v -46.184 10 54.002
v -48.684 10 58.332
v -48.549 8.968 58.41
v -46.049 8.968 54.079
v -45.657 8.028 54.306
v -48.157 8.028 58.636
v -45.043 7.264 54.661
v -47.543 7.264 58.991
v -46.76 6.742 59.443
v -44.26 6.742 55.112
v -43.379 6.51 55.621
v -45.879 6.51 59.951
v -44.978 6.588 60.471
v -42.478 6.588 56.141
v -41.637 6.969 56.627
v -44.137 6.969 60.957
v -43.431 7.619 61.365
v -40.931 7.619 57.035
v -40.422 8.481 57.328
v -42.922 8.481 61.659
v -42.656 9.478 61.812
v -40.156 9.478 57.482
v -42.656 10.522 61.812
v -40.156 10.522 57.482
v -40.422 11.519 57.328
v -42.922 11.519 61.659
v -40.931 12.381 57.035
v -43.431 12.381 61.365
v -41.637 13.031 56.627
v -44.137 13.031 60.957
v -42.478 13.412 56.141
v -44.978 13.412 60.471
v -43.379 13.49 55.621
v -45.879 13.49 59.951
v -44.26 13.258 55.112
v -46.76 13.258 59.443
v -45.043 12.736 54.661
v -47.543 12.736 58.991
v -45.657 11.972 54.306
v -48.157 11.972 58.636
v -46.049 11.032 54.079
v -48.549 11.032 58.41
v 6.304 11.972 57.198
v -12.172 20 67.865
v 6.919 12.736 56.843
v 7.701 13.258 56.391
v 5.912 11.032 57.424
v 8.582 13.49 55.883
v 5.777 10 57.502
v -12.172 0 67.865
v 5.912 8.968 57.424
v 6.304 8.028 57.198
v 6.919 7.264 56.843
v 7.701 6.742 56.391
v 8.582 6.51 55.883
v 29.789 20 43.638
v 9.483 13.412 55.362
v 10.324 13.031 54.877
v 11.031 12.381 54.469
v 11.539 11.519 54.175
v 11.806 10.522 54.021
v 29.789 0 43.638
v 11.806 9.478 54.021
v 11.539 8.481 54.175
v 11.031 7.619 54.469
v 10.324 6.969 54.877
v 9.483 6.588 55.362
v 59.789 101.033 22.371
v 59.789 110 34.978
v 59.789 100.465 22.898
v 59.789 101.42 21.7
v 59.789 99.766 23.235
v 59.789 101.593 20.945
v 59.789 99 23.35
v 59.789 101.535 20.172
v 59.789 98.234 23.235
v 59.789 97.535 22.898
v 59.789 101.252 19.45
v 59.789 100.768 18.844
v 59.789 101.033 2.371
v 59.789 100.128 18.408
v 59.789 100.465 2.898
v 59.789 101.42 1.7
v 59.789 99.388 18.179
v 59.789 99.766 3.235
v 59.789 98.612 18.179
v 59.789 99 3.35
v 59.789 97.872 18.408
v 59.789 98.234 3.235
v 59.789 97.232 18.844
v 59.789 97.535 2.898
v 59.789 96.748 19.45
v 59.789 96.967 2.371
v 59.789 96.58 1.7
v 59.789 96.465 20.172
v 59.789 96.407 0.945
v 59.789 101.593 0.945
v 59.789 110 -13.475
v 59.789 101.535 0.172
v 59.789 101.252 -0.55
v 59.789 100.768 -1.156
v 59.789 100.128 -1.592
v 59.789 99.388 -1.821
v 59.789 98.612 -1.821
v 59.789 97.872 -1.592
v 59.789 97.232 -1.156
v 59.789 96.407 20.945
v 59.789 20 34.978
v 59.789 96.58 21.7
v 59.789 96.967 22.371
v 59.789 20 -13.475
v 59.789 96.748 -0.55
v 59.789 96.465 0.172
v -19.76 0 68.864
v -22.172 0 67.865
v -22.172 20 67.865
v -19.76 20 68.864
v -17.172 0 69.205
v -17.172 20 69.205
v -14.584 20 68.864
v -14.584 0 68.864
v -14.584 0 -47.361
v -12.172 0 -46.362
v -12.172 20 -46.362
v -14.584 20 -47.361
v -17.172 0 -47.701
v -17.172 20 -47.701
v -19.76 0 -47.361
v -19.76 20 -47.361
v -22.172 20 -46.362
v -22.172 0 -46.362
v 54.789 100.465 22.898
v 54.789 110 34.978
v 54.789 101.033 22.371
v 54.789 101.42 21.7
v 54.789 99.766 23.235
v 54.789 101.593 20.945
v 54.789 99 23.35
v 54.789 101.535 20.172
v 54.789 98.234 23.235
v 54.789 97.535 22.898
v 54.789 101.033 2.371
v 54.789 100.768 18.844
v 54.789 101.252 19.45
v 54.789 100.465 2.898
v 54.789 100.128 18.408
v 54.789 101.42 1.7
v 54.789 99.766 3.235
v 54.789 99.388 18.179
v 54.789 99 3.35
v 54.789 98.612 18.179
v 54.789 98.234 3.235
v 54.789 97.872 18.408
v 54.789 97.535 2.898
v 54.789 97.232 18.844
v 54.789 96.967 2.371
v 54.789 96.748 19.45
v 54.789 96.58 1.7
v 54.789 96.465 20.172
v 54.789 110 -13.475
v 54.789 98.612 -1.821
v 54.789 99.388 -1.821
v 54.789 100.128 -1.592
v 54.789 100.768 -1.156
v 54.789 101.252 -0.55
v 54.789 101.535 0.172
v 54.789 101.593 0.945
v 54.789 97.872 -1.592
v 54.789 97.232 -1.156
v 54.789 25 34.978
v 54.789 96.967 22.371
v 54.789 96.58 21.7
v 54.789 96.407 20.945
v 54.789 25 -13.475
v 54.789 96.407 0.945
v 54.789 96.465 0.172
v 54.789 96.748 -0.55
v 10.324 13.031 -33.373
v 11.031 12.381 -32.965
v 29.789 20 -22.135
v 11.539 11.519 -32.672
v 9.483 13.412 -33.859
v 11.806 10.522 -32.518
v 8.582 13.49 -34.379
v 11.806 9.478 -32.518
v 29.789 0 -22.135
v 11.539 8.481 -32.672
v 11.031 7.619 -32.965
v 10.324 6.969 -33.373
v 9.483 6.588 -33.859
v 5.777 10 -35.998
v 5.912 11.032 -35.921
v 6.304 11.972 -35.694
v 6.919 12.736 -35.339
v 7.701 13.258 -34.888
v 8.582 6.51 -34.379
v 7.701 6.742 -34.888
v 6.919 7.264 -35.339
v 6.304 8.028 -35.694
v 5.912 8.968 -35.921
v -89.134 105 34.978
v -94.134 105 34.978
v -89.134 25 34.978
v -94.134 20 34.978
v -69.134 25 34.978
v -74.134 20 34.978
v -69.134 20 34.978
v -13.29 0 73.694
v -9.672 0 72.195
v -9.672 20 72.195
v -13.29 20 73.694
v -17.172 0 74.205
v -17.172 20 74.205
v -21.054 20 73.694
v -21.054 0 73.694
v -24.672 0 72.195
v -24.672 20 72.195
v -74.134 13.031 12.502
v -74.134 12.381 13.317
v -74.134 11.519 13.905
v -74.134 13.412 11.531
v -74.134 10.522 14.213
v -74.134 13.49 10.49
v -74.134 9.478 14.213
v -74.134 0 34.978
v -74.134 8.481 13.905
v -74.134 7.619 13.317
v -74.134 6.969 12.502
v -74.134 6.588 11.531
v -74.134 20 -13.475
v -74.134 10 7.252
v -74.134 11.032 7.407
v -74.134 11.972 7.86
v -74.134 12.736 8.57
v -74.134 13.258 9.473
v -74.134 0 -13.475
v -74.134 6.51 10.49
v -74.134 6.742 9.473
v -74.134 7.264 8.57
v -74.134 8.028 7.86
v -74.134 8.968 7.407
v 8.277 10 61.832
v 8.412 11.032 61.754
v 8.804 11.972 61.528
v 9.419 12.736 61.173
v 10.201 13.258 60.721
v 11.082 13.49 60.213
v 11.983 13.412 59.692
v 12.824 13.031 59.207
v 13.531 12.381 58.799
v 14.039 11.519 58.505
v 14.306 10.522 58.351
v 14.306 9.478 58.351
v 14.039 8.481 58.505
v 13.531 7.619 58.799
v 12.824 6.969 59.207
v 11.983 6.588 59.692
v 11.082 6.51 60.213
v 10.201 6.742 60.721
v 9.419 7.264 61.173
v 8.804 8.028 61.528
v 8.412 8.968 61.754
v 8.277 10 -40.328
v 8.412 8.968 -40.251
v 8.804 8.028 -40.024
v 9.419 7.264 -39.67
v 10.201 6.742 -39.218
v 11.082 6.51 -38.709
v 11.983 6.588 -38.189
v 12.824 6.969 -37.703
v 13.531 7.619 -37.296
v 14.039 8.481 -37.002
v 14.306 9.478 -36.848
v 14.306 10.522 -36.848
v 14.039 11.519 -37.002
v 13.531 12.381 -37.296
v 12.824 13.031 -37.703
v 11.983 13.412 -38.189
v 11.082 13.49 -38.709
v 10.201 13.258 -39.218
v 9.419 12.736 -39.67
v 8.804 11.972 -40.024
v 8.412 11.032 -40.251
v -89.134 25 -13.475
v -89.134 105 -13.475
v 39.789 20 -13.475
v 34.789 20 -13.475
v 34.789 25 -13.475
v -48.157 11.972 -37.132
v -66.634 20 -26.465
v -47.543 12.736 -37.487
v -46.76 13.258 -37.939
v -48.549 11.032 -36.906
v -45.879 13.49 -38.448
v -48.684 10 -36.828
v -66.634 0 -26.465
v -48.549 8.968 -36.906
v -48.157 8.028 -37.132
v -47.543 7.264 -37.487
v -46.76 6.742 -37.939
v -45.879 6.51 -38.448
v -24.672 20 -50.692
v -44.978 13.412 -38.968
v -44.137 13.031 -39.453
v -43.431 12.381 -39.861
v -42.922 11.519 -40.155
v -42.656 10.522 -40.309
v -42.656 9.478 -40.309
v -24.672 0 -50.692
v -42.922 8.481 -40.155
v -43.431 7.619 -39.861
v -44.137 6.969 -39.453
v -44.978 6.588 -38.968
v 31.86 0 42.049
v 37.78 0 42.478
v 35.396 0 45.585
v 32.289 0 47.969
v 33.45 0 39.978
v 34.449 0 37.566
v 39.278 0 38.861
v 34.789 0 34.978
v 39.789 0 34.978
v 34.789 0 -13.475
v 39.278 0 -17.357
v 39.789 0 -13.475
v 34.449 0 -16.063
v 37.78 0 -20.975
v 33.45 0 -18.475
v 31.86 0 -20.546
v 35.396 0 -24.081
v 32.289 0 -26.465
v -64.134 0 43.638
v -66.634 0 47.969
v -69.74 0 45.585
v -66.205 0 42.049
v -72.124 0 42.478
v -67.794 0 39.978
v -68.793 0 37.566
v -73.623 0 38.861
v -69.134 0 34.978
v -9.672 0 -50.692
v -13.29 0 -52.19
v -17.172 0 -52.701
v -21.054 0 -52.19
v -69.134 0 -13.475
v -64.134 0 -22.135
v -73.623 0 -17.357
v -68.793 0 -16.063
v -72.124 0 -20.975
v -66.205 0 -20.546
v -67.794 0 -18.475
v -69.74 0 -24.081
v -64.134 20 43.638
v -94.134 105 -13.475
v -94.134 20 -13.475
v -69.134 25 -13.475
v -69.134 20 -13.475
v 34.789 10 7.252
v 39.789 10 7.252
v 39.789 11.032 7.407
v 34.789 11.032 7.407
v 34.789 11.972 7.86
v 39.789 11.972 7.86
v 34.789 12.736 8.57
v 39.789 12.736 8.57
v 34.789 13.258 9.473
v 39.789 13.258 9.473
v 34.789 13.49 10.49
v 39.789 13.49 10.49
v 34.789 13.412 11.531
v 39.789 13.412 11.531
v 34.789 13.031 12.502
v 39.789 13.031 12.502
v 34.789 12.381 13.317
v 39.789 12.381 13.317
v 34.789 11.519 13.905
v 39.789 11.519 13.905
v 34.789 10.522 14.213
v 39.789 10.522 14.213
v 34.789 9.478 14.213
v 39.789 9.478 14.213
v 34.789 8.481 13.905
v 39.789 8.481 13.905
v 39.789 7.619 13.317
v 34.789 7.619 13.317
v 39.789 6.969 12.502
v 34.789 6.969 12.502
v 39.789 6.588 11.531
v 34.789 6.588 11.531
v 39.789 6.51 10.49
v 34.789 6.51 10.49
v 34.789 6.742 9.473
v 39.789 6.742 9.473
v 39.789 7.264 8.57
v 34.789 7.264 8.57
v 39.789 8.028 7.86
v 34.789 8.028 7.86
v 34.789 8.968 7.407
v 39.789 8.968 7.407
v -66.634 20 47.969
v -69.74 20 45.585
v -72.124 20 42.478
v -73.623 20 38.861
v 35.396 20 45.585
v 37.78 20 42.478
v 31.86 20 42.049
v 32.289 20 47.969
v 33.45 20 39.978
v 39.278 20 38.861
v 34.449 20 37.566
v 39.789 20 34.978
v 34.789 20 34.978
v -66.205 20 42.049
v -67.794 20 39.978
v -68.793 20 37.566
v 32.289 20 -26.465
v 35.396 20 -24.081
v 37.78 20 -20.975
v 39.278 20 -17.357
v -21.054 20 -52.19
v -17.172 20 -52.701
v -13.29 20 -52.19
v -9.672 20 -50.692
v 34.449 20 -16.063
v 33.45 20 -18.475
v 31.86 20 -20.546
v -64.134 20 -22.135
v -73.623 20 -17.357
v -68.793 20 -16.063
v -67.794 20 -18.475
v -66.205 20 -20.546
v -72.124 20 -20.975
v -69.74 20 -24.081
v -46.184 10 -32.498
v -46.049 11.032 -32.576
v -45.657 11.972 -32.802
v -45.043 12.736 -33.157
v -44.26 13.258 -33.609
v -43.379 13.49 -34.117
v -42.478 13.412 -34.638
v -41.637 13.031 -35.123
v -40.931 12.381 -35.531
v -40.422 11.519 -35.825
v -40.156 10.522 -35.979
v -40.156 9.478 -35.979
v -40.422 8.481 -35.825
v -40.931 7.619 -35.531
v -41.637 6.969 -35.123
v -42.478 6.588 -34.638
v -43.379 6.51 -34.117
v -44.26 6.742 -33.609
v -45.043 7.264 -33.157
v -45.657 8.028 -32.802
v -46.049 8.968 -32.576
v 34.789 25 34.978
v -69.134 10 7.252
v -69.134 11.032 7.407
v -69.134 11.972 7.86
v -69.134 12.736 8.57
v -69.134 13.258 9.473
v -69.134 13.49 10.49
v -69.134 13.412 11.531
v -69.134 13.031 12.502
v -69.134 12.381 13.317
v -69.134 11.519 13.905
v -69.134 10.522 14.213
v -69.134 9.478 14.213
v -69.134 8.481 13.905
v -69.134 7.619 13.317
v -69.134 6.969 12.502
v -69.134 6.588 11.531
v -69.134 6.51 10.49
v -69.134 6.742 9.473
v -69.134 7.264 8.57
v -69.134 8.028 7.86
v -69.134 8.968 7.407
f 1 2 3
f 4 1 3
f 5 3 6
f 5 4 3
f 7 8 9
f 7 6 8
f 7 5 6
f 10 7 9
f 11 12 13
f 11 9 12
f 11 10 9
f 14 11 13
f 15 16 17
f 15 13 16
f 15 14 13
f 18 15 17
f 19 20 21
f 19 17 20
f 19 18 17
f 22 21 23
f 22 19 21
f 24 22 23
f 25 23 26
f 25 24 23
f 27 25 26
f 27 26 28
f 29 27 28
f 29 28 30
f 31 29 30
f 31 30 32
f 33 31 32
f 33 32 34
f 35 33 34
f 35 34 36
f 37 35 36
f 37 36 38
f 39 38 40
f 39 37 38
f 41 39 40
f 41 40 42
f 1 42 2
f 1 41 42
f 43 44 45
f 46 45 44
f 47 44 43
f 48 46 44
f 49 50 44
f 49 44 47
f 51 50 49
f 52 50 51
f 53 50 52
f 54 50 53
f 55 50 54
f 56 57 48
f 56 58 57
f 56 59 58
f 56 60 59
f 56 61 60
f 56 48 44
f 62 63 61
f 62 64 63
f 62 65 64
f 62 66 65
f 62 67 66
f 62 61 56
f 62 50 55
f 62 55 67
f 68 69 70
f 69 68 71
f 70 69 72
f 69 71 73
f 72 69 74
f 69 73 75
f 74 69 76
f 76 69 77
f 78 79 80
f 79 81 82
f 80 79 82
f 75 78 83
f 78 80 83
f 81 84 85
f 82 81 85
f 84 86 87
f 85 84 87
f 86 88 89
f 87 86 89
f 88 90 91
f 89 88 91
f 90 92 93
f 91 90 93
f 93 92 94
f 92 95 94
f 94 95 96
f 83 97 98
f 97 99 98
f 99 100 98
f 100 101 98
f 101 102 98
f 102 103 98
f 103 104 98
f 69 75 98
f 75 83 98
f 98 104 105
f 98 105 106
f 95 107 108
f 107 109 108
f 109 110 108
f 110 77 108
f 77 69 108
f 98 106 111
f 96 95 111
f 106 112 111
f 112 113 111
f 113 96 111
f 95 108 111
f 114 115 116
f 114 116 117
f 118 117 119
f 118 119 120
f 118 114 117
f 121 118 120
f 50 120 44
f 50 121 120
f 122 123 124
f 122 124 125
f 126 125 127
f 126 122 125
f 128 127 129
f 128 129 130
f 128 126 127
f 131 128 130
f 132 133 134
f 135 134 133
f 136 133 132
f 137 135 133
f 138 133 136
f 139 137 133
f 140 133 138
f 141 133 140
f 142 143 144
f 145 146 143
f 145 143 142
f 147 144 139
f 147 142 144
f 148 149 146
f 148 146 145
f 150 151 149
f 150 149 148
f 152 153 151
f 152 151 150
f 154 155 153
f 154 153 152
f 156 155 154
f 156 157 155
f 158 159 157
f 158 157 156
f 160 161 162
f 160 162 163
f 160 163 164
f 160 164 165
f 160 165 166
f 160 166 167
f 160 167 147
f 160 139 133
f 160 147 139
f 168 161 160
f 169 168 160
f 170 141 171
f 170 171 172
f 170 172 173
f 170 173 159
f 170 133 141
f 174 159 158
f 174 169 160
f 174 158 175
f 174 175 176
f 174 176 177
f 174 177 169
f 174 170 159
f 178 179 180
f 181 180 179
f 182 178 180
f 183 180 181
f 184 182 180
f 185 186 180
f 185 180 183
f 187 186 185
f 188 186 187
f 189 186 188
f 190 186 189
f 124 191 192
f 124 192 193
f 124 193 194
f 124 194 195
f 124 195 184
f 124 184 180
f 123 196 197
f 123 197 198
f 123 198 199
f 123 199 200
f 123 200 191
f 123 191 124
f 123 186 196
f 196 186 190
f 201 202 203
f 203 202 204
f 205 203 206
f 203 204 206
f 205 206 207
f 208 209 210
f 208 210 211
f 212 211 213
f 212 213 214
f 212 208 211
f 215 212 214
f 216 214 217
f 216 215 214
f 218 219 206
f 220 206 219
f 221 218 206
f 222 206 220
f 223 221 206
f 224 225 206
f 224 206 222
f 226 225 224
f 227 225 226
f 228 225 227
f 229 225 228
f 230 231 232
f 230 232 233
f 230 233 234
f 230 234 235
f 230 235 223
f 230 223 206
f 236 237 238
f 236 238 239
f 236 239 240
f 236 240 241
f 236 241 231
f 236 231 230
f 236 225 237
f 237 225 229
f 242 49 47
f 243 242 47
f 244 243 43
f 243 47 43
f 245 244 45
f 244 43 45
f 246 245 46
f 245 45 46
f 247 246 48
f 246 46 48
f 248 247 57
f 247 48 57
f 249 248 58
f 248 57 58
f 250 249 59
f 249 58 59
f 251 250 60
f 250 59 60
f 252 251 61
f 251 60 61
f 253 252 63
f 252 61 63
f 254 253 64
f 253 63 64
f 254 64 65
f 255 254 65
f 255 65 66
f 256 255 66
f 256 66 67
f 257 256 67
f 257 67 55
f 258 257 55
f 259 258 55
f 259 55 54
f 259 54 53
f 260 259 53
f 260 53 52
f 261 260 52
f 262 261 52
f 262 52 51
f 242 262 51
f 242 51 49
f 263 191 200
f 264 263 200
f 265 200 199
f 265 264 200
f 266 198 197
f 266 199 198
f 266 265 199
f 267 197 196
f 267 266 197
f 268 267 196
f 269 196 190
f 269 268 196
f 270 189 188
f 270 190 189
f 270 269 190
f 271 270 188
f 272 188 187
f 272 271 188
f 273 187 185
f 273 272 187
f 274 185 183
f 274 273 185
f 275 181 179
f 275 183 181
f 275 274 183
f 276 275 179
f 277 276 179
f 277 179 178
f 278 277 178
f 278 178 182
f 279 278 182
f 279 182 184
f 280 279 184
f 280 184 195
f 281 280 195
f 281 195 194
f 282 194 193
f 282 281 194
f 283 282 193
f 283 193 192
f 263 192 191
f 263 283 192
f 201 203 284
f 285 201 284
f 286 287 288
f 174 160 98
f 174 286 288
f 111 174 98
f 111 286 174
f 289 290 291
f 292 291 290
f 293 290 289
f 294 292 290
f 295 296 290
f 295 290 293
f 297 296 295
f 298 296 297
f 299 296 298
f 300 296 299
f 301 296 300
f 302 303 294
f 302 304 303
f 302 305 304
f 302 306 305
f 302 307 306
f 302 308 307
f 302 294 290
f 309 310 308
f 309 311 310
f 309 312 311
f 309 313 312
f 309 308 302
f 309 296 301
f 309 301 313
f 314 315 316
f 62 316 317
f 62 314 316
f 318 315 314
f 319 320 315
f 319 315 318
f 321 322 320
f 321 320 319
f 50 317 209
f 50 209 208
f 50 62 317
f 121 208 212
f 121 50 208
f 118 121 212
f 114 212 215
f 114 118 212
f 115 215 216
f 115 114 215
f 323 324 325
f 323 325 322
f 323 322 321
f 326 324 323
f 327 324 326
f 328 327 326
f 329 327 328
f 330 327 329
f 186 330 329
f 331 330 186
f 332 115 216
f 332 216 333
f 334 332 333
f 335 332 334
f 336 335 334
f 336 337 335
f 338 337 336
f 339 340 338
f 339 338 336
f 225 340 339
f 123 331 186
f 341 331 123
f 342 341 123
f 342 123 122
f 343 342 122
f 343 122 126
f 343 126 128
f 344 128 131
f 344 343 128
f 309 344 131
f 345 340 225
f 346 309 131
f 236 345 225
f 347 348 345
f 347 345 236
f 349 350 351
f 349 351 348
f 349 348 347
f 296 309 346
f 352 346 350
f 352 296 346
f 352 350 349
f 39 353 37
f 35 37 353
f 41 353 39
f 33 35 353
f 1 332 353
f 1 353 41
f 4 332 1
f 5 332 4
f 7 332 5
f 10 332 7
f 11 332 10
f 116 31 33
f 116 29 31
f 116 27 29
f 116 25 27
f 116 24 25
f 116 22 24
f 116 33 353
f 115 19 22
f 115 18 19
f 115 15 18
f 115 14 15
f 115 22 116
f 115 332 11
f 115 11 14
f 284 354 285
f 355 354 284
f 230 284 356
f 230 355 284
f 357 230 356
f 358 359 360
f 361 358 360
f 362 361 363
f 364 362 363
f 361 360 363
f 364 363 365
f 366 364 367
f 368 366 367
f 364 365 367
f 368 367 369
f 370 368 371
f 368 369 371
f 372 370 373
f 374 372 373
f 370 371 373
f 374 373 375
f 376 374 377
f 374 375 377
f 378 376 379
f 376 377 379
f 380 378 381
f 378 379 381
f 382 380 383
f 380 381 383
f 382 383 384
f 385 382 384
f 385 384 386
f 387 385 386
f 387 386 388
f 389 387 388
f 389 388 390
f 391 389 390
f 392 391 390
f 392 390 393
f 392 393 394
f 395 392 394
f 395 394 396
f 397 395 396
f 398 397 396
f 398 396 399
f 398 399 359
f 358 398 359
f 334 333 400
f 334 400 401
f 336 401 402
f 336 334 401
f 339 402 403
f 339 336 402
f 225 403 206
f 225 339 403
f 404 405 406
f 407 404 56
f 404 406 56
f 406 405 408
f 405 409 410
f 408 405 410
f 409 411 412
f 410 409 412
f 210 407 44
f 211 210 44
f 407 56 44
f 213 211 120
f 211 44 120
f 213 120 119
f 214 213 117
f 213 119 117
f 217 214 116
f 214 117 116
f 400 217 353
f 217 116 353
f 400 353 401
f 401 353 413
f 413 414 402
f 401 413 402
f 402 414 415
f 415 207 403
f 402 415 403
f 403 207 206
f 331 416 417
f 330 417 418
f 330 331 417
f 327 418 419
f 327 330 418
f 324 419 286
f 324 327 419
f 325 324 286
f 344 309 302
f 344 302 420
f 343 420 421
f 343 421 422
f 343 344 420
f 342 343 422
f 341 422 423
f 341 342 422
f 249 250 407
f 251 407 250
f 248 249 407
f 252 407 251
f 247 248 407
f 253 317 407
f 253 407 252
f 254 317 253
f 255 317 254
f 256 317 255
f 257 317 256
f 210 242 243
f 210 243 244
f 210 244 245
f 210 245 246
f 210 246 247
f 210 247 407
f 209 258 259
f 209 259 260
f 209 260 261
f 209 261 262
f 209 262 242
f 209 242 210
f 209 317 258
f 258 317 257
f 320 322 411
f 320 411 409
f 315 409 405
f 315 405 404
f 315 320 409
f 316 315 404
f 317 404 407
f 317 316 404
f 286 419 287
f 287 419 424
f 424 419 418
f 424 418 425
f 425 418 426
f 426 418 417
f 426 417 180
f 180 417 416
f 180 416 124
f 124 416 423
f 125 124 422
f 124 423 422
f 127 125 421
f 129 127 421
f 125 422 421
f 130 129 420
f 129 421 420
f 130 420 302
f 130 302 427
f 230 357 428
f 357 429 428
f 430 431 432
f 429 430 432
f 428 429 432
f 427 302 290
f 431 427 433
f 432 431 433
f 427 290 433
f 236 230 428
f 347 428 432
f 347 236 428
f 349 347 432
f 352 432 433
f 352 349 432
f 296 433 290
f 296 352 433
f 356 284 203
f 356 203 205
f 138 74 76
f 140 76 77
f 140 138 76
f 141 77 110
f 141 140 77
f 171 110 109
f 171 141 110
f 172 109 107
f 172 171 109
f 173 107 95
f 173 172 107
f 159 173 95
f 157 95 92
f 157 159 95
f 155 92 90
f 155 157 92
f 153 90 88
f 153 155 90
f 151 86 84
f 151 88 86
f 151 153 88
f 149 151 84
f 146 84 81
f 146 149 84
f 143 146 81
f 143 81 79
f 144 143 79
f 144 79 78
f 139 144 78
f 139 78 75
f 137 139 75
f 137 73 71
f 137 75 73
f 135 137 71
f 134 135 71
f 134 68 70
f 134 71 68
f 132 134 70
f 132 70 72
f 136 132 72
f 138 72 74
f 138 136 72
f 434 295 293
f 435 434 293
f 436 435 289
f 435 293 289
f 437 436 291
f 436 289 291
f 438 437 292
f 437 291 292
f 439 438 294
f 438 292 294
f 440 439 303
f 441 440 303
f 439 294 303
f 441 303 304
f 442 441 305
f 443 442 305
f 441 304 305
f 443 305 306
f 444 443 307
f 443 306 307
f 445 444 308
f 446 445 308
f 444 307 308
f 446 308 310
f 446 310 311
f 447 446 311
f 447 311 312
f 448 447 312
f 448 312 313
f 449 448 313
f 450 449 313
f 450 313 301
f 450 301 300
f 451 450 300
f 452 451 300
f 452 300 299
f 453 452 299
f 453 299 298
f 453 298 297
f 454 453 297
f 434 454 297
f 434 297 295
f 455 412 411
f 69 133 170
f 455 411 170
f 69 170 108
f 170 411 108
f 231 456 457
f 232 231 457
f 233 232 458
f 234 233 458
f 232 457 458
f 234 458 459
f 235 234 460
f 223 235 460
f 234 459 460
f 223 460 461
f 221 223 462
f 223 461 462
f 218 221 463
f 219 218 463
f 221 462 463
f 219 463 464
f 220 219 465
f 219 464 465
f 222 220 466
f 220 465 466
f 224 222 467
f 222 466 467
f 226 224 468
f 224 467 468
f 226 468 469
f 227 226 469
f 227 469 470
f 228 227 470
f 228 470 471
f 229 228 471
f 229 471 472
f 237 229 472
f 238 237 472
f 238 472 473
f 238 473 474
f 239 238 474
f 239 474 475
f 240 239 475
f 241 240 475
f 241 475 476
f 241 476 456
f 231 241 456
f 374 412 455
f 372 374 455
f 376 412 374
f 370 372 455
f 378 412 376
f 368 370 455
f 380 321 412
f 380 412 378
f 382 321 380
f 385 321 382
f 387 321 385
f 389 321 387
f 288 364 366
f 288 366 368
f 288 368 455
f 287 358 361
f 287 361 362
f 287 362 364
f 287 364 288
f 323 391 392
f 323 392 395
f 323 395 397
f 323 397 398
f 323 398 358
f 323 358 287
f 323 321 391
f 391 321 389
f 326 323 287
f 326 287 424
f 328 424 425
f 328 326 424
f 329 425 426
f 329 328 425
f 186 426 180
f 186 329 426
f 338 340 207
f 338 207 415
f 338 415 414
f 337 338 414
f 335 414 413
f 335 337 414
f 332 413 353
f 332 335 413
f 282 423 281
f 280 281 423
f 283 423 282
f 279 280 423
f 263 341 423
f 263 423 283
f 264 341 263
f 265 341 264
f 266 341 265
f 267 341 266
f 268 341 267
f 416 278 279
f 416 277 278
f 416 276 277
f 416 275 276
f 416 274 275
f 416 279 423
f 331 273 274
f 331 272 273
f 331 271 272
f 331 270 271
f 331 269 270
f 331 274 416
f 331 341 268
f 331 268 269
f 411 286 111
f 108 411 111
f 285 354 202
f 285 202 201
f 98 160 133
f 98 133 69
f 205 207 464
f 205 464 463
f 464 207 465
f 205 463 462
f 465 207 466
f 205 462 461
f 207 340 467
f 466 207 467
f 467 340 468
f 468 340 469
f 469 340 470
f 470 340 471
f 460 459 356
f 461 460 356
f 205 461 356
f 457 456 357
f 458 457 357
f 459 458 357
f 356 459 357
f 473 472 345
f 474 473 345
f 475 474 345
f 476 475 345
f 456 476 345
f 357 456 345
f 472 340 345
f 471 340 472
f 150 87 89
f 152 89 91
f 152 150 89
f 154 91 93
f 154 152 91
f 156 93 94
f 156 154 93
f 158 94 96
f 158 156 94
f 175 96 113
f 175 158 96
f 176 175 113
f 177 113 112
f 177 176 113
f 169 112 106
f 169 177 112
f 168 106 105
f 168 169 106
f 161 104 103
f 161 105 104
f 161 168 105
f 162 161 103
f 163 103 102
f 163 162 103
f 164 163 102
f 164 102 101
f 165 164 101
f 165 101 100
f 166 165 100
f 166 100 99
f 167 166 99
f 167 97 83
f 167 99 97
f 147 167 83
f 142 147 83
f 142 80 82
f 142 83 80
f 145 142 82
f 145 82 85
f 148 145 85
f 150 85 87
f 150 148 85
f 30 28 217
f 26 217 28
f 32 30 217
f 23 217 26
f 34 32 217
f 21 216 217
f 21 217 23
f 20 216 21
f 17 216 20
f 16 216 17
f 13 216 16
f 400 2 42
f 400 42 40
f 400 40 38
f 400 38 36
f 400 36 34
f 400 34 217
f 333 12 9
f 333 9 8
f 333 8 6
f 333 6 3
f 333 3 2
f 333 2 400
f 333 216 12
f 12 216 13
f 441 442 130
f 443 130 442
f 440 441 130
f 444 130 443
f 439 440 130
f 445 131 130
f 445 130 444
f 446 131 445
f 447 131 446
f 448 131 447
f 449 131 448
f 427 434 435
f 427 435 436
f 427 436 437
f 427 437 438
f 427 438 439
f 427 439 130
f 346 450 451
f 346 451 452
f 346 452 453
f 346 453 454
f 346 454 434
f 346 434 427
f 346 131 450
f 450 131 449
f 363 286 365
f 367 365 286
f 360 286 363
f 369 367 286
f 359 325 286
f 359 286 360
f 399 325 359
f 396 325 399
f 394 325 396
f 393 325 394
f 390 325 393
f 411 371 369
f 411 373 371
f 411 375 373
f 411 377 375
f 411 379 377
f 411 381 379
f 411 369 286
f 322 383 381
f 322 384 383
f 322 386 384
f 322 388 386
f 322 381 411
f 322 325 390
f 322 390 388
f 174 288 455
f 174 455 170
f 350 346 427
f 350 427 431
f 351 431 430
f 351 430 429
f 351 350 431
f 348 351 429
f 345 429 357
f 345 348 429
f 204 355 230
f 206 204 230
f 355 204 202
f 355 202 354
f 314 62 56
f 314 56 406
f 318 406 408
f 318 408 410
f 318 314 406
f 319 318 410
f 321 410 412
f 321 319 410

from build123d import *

# Parameters (mm, degrees)
Y_KSEKLIK_EKSTR_ZYON1_DEPTH = 20
IZIM3_W                     = 25
IZIM3_H                     = 48.452994616
Y_KSEKLIK_EKSTR_ZYON2_DEPTH = 5
IZIM12_R                    = 3.5
KES_EKSTR_ZYON4_DEPTH       = 200
KES_EKSTR_ZYON5_DEPTH       = 200
KES_EKSTR_ZYON5_DEPTH_BACK  = 200
IZIM13_R                    = 3.5
IZIM14_R                    = 3.5
KES_EKSTR_ZYON6_DEPTH       = 150
IZIM10_W                    = 5
IZIM10_H                    = 48.452994616
Y_KSEKLIK_EKSTR_ZYON3_DEPTH = 80
IZIM15_W                    = 5
IZIM15_H                    = 48.452994616
Y_KSEKLIK_EKSTR_ZYON4_DEPTH = 5
IZIM11_R                    = 2.6
KES_EKSTR_ZYON3_DEPTH       = 5.5


with BuildPart() as part:
    # Çizim1 → Yükseklik-Ekstrüzyon1 (new body)
    with BuildSketch(Plane(origin=(0, 0, 0), x_dir=(1, 0, 0), z_dir=(0, 1, 0))):
        with BuildLine():
            Line((-74.133721197, -34.978223844), (-74.133721197, 13.474770772))
            ThreePointArc((-74.133721197, 13.474770772), (-72.124102253, 20.974770772), (-66.633721197, 26.465151829))
            Line((-66.633721197, 26.465151829), (-24.672196969, 50.691649137))
            ThreePointArc((-24.672196969, 50.691649137), (-17.172196969, 52.70126808), (-9.672196969, 50.691649137))
            Line((-9.672196969, 50.691649137), (32.289327258, 26.465151829))
            ThreePointArc((32.289327258, 26.465151829), (37.779708314, 20.974770772), (39.789327258, 13.474770772))
            Line((39.789327258, 13.474770772), (39.789327258, -34.978223844))
            ThreePointArc((39.789327258, -34.978223844), (37.779708314, -42.478223844), (32.289327258, -47.968604901))
            Line((32.289327258, -47.968604901), (-9.672196969, -72.195102209))
            ThreePointArc((-9.672196969, -72.195102209), (-17.172196969, -74.204721152), (-24.672196969, -72.195102209))
            Line((-24.672196969, -72.195102209), (-66.633721197, -47.968604901))
            ThreePointArc((-66.633721197, -47.968604901), (-72.124102253, -42.478223844), (-74.133721197, -34.978223844))
        make_face()
        with BuildLine():
            Line((-69.133721197, 13.474770772), (-69.133721197, -34.978223844))
            ThreePointArc((-69.133721197, -34.978223844), (-67.793975234, -39.978223844), (-64.133721197, -43.638477882))
            Line((-64.133721197, -43.638477882), (-22.172196969, -67.86497519))
            ThreePointArc((-22.172196969, -67.86497519), (-17.172196969, -69.204721152), (-12.172196969, -67.86497519))
            Line((-12.172196969, -67.86497519), (29.789327258, -43.638477882))
            ThreePointArc((29.789327258, -43.638477882), (33.449581295, -39.978223844), (34.789327258, -34.978223844))
            Line((34.789327258, -34.978223844), (34.789327258, 13.474770772))
            ThreePointArc((34.789327258, 13.474770772), (33.449581295, 18.474770772), (29.789327258, 22.13502481))
            Line((29.789327258, 22.13502481), (-12.172196969, 46.361522118))
            ThreePointArc((-12.172196969, 46.361522118), (-17.172196969, 47.70126808), (-22.172196969, 46.361522118))
            Line((-22.172196969, 46.361522118), (-64.133721197, 22.13502481))
            ThreePointArc((-64.133721197, 22.13502481), (-67.793975234, 18.474770772), (-69.133721197, 13.474770772))
        make_face(mode=Mode.SUBTRACT)
    extrude(amount=Y_KSEKLIK_EKSTR_ZYON1_DEPTH)

    # Çizim3 → Yükseklik-Ekstrüzyon2 (add)
    with BuildSketch(Plane(origin=(0, 20, 0), x_dir=(1, 0, 0), z_dir=(0, 1, 0))):
        with Locations((-81.633721197, -10.751726536)):
            Rectangle(IZIM3_W, IZIM3_H)
        with Locations((47.289327258, -10.751726536)):
            Rectangle(IZIM3_W, IZIM3_H)
    extrude(amount=Y_KSEKLIK_EKSTR_ZYON2_DEPTH)

    # Çizim12 → Kes-Ekstrüzyon4 (cut)
    with BuildSketch(Plane(origin=(39.789327258, 0, 0), x_dir=(0, 0, -1), z_dir=(1, 0, 0))):
        with Locations((-10.751726536, 10)):
            Circle(IZIM12_R)
    extrude(amount=-KES_EKSTR_ZYON4_DEPTH, mode=Mode.SUBTRACT)

    # Çizim13 → Kes-Ekstrüzyon5 (cut, two sides: drawn at the far end of the back side and taken through both)
    with BuildSketch(Plane(origin=(10.467209436, 0, -39.064157428), x_dir=(0.8660254037844397, 0, 0.4999999999999982), z_dir=(-0.4999999999999983, 0, 0.8660254037844398)).offset(-KES_EKSTR_ZYON5_DEPTH_BACK)):
        with Locations(Location((0.971513889, 10, 0), (0, 0, 180))):
            Circle(IZIM13_R)
    extrude(amount=KES_EKSTR_ZYON5_DEPTH + KES_EKSTR_ZYON5_DEPTH_BACK, mode=Mode.SUBTRACT)

    # Çizim14 → Kes-Ekstrüzyon6 (cut)
    with BuildSketch(Plane(origin=(-28.118177199, 0, -48.702111524), x_dir=(-0.8660254037844375, 0, 0.500000000000002), z_dir=(-0.500000000000002, 0, -0.8660254037844375))):
        with Locations((20.247422082, 10)):
            Circle(IZIM14_R)
    extrude(amount=-KES_EKSTR_ZYON6_DEPTH, mode=Mode.SUBTRACT)

    # Çizim10 → Yükseklik-Ekstrüzyon3 (add)
    with BuildSketch(Plane(origin=(0, 25, 0), x_dir=(1, 0, 0), z_dir=(0, 1, 0))):
        with Locations((57.289327258, -10.751726536)):
            Rectangle(IZIM10_W, IZIM10_H)
        with Locations((-91.633721197, -10.751726536)):
            Rectangle(IZIM10_W, IZIM10_H)
    extrude(amount=Y_KSEKLIK_EKSTR_ZYON3_DEPTH)

    # Çizim15 → Yükseklik-Ekstrüzyon4 (add)
    with BuildSketch(Plane(origin=(0, 105, 0), x_dir=(1, 0, 0), z_dir=(0, 1, 0))):
        with Locations((57.289327258, -10.751726536)):
            Rectangle(IZIM15_W, IZIM15_H)
    extrude(amount=Y_KSEKLIK_EKSTR_ZYON4_DEPTH)

    # Çizim11 → Kes-Ekstrüzyon3 (cut)
    with BuildSketch(Plane(origin=(54.789327258, 0, 0), x_dir=(0, 0, -1), z_dir=(1, 0, 0))):
        with Locations(Location((-20.750229228, 99, 0), (0, 0, 180))):
            Circle(IZIM11_R)
        with Locations(Location((-0.750229228, 99, 0), (0, 0, 180))):
            Circle(IZIM11_R)
    extrude(amount=KES_EKSTR_ZYON3_DEPTH, mode=Mode.SUBTRACT)


solid = part.part
